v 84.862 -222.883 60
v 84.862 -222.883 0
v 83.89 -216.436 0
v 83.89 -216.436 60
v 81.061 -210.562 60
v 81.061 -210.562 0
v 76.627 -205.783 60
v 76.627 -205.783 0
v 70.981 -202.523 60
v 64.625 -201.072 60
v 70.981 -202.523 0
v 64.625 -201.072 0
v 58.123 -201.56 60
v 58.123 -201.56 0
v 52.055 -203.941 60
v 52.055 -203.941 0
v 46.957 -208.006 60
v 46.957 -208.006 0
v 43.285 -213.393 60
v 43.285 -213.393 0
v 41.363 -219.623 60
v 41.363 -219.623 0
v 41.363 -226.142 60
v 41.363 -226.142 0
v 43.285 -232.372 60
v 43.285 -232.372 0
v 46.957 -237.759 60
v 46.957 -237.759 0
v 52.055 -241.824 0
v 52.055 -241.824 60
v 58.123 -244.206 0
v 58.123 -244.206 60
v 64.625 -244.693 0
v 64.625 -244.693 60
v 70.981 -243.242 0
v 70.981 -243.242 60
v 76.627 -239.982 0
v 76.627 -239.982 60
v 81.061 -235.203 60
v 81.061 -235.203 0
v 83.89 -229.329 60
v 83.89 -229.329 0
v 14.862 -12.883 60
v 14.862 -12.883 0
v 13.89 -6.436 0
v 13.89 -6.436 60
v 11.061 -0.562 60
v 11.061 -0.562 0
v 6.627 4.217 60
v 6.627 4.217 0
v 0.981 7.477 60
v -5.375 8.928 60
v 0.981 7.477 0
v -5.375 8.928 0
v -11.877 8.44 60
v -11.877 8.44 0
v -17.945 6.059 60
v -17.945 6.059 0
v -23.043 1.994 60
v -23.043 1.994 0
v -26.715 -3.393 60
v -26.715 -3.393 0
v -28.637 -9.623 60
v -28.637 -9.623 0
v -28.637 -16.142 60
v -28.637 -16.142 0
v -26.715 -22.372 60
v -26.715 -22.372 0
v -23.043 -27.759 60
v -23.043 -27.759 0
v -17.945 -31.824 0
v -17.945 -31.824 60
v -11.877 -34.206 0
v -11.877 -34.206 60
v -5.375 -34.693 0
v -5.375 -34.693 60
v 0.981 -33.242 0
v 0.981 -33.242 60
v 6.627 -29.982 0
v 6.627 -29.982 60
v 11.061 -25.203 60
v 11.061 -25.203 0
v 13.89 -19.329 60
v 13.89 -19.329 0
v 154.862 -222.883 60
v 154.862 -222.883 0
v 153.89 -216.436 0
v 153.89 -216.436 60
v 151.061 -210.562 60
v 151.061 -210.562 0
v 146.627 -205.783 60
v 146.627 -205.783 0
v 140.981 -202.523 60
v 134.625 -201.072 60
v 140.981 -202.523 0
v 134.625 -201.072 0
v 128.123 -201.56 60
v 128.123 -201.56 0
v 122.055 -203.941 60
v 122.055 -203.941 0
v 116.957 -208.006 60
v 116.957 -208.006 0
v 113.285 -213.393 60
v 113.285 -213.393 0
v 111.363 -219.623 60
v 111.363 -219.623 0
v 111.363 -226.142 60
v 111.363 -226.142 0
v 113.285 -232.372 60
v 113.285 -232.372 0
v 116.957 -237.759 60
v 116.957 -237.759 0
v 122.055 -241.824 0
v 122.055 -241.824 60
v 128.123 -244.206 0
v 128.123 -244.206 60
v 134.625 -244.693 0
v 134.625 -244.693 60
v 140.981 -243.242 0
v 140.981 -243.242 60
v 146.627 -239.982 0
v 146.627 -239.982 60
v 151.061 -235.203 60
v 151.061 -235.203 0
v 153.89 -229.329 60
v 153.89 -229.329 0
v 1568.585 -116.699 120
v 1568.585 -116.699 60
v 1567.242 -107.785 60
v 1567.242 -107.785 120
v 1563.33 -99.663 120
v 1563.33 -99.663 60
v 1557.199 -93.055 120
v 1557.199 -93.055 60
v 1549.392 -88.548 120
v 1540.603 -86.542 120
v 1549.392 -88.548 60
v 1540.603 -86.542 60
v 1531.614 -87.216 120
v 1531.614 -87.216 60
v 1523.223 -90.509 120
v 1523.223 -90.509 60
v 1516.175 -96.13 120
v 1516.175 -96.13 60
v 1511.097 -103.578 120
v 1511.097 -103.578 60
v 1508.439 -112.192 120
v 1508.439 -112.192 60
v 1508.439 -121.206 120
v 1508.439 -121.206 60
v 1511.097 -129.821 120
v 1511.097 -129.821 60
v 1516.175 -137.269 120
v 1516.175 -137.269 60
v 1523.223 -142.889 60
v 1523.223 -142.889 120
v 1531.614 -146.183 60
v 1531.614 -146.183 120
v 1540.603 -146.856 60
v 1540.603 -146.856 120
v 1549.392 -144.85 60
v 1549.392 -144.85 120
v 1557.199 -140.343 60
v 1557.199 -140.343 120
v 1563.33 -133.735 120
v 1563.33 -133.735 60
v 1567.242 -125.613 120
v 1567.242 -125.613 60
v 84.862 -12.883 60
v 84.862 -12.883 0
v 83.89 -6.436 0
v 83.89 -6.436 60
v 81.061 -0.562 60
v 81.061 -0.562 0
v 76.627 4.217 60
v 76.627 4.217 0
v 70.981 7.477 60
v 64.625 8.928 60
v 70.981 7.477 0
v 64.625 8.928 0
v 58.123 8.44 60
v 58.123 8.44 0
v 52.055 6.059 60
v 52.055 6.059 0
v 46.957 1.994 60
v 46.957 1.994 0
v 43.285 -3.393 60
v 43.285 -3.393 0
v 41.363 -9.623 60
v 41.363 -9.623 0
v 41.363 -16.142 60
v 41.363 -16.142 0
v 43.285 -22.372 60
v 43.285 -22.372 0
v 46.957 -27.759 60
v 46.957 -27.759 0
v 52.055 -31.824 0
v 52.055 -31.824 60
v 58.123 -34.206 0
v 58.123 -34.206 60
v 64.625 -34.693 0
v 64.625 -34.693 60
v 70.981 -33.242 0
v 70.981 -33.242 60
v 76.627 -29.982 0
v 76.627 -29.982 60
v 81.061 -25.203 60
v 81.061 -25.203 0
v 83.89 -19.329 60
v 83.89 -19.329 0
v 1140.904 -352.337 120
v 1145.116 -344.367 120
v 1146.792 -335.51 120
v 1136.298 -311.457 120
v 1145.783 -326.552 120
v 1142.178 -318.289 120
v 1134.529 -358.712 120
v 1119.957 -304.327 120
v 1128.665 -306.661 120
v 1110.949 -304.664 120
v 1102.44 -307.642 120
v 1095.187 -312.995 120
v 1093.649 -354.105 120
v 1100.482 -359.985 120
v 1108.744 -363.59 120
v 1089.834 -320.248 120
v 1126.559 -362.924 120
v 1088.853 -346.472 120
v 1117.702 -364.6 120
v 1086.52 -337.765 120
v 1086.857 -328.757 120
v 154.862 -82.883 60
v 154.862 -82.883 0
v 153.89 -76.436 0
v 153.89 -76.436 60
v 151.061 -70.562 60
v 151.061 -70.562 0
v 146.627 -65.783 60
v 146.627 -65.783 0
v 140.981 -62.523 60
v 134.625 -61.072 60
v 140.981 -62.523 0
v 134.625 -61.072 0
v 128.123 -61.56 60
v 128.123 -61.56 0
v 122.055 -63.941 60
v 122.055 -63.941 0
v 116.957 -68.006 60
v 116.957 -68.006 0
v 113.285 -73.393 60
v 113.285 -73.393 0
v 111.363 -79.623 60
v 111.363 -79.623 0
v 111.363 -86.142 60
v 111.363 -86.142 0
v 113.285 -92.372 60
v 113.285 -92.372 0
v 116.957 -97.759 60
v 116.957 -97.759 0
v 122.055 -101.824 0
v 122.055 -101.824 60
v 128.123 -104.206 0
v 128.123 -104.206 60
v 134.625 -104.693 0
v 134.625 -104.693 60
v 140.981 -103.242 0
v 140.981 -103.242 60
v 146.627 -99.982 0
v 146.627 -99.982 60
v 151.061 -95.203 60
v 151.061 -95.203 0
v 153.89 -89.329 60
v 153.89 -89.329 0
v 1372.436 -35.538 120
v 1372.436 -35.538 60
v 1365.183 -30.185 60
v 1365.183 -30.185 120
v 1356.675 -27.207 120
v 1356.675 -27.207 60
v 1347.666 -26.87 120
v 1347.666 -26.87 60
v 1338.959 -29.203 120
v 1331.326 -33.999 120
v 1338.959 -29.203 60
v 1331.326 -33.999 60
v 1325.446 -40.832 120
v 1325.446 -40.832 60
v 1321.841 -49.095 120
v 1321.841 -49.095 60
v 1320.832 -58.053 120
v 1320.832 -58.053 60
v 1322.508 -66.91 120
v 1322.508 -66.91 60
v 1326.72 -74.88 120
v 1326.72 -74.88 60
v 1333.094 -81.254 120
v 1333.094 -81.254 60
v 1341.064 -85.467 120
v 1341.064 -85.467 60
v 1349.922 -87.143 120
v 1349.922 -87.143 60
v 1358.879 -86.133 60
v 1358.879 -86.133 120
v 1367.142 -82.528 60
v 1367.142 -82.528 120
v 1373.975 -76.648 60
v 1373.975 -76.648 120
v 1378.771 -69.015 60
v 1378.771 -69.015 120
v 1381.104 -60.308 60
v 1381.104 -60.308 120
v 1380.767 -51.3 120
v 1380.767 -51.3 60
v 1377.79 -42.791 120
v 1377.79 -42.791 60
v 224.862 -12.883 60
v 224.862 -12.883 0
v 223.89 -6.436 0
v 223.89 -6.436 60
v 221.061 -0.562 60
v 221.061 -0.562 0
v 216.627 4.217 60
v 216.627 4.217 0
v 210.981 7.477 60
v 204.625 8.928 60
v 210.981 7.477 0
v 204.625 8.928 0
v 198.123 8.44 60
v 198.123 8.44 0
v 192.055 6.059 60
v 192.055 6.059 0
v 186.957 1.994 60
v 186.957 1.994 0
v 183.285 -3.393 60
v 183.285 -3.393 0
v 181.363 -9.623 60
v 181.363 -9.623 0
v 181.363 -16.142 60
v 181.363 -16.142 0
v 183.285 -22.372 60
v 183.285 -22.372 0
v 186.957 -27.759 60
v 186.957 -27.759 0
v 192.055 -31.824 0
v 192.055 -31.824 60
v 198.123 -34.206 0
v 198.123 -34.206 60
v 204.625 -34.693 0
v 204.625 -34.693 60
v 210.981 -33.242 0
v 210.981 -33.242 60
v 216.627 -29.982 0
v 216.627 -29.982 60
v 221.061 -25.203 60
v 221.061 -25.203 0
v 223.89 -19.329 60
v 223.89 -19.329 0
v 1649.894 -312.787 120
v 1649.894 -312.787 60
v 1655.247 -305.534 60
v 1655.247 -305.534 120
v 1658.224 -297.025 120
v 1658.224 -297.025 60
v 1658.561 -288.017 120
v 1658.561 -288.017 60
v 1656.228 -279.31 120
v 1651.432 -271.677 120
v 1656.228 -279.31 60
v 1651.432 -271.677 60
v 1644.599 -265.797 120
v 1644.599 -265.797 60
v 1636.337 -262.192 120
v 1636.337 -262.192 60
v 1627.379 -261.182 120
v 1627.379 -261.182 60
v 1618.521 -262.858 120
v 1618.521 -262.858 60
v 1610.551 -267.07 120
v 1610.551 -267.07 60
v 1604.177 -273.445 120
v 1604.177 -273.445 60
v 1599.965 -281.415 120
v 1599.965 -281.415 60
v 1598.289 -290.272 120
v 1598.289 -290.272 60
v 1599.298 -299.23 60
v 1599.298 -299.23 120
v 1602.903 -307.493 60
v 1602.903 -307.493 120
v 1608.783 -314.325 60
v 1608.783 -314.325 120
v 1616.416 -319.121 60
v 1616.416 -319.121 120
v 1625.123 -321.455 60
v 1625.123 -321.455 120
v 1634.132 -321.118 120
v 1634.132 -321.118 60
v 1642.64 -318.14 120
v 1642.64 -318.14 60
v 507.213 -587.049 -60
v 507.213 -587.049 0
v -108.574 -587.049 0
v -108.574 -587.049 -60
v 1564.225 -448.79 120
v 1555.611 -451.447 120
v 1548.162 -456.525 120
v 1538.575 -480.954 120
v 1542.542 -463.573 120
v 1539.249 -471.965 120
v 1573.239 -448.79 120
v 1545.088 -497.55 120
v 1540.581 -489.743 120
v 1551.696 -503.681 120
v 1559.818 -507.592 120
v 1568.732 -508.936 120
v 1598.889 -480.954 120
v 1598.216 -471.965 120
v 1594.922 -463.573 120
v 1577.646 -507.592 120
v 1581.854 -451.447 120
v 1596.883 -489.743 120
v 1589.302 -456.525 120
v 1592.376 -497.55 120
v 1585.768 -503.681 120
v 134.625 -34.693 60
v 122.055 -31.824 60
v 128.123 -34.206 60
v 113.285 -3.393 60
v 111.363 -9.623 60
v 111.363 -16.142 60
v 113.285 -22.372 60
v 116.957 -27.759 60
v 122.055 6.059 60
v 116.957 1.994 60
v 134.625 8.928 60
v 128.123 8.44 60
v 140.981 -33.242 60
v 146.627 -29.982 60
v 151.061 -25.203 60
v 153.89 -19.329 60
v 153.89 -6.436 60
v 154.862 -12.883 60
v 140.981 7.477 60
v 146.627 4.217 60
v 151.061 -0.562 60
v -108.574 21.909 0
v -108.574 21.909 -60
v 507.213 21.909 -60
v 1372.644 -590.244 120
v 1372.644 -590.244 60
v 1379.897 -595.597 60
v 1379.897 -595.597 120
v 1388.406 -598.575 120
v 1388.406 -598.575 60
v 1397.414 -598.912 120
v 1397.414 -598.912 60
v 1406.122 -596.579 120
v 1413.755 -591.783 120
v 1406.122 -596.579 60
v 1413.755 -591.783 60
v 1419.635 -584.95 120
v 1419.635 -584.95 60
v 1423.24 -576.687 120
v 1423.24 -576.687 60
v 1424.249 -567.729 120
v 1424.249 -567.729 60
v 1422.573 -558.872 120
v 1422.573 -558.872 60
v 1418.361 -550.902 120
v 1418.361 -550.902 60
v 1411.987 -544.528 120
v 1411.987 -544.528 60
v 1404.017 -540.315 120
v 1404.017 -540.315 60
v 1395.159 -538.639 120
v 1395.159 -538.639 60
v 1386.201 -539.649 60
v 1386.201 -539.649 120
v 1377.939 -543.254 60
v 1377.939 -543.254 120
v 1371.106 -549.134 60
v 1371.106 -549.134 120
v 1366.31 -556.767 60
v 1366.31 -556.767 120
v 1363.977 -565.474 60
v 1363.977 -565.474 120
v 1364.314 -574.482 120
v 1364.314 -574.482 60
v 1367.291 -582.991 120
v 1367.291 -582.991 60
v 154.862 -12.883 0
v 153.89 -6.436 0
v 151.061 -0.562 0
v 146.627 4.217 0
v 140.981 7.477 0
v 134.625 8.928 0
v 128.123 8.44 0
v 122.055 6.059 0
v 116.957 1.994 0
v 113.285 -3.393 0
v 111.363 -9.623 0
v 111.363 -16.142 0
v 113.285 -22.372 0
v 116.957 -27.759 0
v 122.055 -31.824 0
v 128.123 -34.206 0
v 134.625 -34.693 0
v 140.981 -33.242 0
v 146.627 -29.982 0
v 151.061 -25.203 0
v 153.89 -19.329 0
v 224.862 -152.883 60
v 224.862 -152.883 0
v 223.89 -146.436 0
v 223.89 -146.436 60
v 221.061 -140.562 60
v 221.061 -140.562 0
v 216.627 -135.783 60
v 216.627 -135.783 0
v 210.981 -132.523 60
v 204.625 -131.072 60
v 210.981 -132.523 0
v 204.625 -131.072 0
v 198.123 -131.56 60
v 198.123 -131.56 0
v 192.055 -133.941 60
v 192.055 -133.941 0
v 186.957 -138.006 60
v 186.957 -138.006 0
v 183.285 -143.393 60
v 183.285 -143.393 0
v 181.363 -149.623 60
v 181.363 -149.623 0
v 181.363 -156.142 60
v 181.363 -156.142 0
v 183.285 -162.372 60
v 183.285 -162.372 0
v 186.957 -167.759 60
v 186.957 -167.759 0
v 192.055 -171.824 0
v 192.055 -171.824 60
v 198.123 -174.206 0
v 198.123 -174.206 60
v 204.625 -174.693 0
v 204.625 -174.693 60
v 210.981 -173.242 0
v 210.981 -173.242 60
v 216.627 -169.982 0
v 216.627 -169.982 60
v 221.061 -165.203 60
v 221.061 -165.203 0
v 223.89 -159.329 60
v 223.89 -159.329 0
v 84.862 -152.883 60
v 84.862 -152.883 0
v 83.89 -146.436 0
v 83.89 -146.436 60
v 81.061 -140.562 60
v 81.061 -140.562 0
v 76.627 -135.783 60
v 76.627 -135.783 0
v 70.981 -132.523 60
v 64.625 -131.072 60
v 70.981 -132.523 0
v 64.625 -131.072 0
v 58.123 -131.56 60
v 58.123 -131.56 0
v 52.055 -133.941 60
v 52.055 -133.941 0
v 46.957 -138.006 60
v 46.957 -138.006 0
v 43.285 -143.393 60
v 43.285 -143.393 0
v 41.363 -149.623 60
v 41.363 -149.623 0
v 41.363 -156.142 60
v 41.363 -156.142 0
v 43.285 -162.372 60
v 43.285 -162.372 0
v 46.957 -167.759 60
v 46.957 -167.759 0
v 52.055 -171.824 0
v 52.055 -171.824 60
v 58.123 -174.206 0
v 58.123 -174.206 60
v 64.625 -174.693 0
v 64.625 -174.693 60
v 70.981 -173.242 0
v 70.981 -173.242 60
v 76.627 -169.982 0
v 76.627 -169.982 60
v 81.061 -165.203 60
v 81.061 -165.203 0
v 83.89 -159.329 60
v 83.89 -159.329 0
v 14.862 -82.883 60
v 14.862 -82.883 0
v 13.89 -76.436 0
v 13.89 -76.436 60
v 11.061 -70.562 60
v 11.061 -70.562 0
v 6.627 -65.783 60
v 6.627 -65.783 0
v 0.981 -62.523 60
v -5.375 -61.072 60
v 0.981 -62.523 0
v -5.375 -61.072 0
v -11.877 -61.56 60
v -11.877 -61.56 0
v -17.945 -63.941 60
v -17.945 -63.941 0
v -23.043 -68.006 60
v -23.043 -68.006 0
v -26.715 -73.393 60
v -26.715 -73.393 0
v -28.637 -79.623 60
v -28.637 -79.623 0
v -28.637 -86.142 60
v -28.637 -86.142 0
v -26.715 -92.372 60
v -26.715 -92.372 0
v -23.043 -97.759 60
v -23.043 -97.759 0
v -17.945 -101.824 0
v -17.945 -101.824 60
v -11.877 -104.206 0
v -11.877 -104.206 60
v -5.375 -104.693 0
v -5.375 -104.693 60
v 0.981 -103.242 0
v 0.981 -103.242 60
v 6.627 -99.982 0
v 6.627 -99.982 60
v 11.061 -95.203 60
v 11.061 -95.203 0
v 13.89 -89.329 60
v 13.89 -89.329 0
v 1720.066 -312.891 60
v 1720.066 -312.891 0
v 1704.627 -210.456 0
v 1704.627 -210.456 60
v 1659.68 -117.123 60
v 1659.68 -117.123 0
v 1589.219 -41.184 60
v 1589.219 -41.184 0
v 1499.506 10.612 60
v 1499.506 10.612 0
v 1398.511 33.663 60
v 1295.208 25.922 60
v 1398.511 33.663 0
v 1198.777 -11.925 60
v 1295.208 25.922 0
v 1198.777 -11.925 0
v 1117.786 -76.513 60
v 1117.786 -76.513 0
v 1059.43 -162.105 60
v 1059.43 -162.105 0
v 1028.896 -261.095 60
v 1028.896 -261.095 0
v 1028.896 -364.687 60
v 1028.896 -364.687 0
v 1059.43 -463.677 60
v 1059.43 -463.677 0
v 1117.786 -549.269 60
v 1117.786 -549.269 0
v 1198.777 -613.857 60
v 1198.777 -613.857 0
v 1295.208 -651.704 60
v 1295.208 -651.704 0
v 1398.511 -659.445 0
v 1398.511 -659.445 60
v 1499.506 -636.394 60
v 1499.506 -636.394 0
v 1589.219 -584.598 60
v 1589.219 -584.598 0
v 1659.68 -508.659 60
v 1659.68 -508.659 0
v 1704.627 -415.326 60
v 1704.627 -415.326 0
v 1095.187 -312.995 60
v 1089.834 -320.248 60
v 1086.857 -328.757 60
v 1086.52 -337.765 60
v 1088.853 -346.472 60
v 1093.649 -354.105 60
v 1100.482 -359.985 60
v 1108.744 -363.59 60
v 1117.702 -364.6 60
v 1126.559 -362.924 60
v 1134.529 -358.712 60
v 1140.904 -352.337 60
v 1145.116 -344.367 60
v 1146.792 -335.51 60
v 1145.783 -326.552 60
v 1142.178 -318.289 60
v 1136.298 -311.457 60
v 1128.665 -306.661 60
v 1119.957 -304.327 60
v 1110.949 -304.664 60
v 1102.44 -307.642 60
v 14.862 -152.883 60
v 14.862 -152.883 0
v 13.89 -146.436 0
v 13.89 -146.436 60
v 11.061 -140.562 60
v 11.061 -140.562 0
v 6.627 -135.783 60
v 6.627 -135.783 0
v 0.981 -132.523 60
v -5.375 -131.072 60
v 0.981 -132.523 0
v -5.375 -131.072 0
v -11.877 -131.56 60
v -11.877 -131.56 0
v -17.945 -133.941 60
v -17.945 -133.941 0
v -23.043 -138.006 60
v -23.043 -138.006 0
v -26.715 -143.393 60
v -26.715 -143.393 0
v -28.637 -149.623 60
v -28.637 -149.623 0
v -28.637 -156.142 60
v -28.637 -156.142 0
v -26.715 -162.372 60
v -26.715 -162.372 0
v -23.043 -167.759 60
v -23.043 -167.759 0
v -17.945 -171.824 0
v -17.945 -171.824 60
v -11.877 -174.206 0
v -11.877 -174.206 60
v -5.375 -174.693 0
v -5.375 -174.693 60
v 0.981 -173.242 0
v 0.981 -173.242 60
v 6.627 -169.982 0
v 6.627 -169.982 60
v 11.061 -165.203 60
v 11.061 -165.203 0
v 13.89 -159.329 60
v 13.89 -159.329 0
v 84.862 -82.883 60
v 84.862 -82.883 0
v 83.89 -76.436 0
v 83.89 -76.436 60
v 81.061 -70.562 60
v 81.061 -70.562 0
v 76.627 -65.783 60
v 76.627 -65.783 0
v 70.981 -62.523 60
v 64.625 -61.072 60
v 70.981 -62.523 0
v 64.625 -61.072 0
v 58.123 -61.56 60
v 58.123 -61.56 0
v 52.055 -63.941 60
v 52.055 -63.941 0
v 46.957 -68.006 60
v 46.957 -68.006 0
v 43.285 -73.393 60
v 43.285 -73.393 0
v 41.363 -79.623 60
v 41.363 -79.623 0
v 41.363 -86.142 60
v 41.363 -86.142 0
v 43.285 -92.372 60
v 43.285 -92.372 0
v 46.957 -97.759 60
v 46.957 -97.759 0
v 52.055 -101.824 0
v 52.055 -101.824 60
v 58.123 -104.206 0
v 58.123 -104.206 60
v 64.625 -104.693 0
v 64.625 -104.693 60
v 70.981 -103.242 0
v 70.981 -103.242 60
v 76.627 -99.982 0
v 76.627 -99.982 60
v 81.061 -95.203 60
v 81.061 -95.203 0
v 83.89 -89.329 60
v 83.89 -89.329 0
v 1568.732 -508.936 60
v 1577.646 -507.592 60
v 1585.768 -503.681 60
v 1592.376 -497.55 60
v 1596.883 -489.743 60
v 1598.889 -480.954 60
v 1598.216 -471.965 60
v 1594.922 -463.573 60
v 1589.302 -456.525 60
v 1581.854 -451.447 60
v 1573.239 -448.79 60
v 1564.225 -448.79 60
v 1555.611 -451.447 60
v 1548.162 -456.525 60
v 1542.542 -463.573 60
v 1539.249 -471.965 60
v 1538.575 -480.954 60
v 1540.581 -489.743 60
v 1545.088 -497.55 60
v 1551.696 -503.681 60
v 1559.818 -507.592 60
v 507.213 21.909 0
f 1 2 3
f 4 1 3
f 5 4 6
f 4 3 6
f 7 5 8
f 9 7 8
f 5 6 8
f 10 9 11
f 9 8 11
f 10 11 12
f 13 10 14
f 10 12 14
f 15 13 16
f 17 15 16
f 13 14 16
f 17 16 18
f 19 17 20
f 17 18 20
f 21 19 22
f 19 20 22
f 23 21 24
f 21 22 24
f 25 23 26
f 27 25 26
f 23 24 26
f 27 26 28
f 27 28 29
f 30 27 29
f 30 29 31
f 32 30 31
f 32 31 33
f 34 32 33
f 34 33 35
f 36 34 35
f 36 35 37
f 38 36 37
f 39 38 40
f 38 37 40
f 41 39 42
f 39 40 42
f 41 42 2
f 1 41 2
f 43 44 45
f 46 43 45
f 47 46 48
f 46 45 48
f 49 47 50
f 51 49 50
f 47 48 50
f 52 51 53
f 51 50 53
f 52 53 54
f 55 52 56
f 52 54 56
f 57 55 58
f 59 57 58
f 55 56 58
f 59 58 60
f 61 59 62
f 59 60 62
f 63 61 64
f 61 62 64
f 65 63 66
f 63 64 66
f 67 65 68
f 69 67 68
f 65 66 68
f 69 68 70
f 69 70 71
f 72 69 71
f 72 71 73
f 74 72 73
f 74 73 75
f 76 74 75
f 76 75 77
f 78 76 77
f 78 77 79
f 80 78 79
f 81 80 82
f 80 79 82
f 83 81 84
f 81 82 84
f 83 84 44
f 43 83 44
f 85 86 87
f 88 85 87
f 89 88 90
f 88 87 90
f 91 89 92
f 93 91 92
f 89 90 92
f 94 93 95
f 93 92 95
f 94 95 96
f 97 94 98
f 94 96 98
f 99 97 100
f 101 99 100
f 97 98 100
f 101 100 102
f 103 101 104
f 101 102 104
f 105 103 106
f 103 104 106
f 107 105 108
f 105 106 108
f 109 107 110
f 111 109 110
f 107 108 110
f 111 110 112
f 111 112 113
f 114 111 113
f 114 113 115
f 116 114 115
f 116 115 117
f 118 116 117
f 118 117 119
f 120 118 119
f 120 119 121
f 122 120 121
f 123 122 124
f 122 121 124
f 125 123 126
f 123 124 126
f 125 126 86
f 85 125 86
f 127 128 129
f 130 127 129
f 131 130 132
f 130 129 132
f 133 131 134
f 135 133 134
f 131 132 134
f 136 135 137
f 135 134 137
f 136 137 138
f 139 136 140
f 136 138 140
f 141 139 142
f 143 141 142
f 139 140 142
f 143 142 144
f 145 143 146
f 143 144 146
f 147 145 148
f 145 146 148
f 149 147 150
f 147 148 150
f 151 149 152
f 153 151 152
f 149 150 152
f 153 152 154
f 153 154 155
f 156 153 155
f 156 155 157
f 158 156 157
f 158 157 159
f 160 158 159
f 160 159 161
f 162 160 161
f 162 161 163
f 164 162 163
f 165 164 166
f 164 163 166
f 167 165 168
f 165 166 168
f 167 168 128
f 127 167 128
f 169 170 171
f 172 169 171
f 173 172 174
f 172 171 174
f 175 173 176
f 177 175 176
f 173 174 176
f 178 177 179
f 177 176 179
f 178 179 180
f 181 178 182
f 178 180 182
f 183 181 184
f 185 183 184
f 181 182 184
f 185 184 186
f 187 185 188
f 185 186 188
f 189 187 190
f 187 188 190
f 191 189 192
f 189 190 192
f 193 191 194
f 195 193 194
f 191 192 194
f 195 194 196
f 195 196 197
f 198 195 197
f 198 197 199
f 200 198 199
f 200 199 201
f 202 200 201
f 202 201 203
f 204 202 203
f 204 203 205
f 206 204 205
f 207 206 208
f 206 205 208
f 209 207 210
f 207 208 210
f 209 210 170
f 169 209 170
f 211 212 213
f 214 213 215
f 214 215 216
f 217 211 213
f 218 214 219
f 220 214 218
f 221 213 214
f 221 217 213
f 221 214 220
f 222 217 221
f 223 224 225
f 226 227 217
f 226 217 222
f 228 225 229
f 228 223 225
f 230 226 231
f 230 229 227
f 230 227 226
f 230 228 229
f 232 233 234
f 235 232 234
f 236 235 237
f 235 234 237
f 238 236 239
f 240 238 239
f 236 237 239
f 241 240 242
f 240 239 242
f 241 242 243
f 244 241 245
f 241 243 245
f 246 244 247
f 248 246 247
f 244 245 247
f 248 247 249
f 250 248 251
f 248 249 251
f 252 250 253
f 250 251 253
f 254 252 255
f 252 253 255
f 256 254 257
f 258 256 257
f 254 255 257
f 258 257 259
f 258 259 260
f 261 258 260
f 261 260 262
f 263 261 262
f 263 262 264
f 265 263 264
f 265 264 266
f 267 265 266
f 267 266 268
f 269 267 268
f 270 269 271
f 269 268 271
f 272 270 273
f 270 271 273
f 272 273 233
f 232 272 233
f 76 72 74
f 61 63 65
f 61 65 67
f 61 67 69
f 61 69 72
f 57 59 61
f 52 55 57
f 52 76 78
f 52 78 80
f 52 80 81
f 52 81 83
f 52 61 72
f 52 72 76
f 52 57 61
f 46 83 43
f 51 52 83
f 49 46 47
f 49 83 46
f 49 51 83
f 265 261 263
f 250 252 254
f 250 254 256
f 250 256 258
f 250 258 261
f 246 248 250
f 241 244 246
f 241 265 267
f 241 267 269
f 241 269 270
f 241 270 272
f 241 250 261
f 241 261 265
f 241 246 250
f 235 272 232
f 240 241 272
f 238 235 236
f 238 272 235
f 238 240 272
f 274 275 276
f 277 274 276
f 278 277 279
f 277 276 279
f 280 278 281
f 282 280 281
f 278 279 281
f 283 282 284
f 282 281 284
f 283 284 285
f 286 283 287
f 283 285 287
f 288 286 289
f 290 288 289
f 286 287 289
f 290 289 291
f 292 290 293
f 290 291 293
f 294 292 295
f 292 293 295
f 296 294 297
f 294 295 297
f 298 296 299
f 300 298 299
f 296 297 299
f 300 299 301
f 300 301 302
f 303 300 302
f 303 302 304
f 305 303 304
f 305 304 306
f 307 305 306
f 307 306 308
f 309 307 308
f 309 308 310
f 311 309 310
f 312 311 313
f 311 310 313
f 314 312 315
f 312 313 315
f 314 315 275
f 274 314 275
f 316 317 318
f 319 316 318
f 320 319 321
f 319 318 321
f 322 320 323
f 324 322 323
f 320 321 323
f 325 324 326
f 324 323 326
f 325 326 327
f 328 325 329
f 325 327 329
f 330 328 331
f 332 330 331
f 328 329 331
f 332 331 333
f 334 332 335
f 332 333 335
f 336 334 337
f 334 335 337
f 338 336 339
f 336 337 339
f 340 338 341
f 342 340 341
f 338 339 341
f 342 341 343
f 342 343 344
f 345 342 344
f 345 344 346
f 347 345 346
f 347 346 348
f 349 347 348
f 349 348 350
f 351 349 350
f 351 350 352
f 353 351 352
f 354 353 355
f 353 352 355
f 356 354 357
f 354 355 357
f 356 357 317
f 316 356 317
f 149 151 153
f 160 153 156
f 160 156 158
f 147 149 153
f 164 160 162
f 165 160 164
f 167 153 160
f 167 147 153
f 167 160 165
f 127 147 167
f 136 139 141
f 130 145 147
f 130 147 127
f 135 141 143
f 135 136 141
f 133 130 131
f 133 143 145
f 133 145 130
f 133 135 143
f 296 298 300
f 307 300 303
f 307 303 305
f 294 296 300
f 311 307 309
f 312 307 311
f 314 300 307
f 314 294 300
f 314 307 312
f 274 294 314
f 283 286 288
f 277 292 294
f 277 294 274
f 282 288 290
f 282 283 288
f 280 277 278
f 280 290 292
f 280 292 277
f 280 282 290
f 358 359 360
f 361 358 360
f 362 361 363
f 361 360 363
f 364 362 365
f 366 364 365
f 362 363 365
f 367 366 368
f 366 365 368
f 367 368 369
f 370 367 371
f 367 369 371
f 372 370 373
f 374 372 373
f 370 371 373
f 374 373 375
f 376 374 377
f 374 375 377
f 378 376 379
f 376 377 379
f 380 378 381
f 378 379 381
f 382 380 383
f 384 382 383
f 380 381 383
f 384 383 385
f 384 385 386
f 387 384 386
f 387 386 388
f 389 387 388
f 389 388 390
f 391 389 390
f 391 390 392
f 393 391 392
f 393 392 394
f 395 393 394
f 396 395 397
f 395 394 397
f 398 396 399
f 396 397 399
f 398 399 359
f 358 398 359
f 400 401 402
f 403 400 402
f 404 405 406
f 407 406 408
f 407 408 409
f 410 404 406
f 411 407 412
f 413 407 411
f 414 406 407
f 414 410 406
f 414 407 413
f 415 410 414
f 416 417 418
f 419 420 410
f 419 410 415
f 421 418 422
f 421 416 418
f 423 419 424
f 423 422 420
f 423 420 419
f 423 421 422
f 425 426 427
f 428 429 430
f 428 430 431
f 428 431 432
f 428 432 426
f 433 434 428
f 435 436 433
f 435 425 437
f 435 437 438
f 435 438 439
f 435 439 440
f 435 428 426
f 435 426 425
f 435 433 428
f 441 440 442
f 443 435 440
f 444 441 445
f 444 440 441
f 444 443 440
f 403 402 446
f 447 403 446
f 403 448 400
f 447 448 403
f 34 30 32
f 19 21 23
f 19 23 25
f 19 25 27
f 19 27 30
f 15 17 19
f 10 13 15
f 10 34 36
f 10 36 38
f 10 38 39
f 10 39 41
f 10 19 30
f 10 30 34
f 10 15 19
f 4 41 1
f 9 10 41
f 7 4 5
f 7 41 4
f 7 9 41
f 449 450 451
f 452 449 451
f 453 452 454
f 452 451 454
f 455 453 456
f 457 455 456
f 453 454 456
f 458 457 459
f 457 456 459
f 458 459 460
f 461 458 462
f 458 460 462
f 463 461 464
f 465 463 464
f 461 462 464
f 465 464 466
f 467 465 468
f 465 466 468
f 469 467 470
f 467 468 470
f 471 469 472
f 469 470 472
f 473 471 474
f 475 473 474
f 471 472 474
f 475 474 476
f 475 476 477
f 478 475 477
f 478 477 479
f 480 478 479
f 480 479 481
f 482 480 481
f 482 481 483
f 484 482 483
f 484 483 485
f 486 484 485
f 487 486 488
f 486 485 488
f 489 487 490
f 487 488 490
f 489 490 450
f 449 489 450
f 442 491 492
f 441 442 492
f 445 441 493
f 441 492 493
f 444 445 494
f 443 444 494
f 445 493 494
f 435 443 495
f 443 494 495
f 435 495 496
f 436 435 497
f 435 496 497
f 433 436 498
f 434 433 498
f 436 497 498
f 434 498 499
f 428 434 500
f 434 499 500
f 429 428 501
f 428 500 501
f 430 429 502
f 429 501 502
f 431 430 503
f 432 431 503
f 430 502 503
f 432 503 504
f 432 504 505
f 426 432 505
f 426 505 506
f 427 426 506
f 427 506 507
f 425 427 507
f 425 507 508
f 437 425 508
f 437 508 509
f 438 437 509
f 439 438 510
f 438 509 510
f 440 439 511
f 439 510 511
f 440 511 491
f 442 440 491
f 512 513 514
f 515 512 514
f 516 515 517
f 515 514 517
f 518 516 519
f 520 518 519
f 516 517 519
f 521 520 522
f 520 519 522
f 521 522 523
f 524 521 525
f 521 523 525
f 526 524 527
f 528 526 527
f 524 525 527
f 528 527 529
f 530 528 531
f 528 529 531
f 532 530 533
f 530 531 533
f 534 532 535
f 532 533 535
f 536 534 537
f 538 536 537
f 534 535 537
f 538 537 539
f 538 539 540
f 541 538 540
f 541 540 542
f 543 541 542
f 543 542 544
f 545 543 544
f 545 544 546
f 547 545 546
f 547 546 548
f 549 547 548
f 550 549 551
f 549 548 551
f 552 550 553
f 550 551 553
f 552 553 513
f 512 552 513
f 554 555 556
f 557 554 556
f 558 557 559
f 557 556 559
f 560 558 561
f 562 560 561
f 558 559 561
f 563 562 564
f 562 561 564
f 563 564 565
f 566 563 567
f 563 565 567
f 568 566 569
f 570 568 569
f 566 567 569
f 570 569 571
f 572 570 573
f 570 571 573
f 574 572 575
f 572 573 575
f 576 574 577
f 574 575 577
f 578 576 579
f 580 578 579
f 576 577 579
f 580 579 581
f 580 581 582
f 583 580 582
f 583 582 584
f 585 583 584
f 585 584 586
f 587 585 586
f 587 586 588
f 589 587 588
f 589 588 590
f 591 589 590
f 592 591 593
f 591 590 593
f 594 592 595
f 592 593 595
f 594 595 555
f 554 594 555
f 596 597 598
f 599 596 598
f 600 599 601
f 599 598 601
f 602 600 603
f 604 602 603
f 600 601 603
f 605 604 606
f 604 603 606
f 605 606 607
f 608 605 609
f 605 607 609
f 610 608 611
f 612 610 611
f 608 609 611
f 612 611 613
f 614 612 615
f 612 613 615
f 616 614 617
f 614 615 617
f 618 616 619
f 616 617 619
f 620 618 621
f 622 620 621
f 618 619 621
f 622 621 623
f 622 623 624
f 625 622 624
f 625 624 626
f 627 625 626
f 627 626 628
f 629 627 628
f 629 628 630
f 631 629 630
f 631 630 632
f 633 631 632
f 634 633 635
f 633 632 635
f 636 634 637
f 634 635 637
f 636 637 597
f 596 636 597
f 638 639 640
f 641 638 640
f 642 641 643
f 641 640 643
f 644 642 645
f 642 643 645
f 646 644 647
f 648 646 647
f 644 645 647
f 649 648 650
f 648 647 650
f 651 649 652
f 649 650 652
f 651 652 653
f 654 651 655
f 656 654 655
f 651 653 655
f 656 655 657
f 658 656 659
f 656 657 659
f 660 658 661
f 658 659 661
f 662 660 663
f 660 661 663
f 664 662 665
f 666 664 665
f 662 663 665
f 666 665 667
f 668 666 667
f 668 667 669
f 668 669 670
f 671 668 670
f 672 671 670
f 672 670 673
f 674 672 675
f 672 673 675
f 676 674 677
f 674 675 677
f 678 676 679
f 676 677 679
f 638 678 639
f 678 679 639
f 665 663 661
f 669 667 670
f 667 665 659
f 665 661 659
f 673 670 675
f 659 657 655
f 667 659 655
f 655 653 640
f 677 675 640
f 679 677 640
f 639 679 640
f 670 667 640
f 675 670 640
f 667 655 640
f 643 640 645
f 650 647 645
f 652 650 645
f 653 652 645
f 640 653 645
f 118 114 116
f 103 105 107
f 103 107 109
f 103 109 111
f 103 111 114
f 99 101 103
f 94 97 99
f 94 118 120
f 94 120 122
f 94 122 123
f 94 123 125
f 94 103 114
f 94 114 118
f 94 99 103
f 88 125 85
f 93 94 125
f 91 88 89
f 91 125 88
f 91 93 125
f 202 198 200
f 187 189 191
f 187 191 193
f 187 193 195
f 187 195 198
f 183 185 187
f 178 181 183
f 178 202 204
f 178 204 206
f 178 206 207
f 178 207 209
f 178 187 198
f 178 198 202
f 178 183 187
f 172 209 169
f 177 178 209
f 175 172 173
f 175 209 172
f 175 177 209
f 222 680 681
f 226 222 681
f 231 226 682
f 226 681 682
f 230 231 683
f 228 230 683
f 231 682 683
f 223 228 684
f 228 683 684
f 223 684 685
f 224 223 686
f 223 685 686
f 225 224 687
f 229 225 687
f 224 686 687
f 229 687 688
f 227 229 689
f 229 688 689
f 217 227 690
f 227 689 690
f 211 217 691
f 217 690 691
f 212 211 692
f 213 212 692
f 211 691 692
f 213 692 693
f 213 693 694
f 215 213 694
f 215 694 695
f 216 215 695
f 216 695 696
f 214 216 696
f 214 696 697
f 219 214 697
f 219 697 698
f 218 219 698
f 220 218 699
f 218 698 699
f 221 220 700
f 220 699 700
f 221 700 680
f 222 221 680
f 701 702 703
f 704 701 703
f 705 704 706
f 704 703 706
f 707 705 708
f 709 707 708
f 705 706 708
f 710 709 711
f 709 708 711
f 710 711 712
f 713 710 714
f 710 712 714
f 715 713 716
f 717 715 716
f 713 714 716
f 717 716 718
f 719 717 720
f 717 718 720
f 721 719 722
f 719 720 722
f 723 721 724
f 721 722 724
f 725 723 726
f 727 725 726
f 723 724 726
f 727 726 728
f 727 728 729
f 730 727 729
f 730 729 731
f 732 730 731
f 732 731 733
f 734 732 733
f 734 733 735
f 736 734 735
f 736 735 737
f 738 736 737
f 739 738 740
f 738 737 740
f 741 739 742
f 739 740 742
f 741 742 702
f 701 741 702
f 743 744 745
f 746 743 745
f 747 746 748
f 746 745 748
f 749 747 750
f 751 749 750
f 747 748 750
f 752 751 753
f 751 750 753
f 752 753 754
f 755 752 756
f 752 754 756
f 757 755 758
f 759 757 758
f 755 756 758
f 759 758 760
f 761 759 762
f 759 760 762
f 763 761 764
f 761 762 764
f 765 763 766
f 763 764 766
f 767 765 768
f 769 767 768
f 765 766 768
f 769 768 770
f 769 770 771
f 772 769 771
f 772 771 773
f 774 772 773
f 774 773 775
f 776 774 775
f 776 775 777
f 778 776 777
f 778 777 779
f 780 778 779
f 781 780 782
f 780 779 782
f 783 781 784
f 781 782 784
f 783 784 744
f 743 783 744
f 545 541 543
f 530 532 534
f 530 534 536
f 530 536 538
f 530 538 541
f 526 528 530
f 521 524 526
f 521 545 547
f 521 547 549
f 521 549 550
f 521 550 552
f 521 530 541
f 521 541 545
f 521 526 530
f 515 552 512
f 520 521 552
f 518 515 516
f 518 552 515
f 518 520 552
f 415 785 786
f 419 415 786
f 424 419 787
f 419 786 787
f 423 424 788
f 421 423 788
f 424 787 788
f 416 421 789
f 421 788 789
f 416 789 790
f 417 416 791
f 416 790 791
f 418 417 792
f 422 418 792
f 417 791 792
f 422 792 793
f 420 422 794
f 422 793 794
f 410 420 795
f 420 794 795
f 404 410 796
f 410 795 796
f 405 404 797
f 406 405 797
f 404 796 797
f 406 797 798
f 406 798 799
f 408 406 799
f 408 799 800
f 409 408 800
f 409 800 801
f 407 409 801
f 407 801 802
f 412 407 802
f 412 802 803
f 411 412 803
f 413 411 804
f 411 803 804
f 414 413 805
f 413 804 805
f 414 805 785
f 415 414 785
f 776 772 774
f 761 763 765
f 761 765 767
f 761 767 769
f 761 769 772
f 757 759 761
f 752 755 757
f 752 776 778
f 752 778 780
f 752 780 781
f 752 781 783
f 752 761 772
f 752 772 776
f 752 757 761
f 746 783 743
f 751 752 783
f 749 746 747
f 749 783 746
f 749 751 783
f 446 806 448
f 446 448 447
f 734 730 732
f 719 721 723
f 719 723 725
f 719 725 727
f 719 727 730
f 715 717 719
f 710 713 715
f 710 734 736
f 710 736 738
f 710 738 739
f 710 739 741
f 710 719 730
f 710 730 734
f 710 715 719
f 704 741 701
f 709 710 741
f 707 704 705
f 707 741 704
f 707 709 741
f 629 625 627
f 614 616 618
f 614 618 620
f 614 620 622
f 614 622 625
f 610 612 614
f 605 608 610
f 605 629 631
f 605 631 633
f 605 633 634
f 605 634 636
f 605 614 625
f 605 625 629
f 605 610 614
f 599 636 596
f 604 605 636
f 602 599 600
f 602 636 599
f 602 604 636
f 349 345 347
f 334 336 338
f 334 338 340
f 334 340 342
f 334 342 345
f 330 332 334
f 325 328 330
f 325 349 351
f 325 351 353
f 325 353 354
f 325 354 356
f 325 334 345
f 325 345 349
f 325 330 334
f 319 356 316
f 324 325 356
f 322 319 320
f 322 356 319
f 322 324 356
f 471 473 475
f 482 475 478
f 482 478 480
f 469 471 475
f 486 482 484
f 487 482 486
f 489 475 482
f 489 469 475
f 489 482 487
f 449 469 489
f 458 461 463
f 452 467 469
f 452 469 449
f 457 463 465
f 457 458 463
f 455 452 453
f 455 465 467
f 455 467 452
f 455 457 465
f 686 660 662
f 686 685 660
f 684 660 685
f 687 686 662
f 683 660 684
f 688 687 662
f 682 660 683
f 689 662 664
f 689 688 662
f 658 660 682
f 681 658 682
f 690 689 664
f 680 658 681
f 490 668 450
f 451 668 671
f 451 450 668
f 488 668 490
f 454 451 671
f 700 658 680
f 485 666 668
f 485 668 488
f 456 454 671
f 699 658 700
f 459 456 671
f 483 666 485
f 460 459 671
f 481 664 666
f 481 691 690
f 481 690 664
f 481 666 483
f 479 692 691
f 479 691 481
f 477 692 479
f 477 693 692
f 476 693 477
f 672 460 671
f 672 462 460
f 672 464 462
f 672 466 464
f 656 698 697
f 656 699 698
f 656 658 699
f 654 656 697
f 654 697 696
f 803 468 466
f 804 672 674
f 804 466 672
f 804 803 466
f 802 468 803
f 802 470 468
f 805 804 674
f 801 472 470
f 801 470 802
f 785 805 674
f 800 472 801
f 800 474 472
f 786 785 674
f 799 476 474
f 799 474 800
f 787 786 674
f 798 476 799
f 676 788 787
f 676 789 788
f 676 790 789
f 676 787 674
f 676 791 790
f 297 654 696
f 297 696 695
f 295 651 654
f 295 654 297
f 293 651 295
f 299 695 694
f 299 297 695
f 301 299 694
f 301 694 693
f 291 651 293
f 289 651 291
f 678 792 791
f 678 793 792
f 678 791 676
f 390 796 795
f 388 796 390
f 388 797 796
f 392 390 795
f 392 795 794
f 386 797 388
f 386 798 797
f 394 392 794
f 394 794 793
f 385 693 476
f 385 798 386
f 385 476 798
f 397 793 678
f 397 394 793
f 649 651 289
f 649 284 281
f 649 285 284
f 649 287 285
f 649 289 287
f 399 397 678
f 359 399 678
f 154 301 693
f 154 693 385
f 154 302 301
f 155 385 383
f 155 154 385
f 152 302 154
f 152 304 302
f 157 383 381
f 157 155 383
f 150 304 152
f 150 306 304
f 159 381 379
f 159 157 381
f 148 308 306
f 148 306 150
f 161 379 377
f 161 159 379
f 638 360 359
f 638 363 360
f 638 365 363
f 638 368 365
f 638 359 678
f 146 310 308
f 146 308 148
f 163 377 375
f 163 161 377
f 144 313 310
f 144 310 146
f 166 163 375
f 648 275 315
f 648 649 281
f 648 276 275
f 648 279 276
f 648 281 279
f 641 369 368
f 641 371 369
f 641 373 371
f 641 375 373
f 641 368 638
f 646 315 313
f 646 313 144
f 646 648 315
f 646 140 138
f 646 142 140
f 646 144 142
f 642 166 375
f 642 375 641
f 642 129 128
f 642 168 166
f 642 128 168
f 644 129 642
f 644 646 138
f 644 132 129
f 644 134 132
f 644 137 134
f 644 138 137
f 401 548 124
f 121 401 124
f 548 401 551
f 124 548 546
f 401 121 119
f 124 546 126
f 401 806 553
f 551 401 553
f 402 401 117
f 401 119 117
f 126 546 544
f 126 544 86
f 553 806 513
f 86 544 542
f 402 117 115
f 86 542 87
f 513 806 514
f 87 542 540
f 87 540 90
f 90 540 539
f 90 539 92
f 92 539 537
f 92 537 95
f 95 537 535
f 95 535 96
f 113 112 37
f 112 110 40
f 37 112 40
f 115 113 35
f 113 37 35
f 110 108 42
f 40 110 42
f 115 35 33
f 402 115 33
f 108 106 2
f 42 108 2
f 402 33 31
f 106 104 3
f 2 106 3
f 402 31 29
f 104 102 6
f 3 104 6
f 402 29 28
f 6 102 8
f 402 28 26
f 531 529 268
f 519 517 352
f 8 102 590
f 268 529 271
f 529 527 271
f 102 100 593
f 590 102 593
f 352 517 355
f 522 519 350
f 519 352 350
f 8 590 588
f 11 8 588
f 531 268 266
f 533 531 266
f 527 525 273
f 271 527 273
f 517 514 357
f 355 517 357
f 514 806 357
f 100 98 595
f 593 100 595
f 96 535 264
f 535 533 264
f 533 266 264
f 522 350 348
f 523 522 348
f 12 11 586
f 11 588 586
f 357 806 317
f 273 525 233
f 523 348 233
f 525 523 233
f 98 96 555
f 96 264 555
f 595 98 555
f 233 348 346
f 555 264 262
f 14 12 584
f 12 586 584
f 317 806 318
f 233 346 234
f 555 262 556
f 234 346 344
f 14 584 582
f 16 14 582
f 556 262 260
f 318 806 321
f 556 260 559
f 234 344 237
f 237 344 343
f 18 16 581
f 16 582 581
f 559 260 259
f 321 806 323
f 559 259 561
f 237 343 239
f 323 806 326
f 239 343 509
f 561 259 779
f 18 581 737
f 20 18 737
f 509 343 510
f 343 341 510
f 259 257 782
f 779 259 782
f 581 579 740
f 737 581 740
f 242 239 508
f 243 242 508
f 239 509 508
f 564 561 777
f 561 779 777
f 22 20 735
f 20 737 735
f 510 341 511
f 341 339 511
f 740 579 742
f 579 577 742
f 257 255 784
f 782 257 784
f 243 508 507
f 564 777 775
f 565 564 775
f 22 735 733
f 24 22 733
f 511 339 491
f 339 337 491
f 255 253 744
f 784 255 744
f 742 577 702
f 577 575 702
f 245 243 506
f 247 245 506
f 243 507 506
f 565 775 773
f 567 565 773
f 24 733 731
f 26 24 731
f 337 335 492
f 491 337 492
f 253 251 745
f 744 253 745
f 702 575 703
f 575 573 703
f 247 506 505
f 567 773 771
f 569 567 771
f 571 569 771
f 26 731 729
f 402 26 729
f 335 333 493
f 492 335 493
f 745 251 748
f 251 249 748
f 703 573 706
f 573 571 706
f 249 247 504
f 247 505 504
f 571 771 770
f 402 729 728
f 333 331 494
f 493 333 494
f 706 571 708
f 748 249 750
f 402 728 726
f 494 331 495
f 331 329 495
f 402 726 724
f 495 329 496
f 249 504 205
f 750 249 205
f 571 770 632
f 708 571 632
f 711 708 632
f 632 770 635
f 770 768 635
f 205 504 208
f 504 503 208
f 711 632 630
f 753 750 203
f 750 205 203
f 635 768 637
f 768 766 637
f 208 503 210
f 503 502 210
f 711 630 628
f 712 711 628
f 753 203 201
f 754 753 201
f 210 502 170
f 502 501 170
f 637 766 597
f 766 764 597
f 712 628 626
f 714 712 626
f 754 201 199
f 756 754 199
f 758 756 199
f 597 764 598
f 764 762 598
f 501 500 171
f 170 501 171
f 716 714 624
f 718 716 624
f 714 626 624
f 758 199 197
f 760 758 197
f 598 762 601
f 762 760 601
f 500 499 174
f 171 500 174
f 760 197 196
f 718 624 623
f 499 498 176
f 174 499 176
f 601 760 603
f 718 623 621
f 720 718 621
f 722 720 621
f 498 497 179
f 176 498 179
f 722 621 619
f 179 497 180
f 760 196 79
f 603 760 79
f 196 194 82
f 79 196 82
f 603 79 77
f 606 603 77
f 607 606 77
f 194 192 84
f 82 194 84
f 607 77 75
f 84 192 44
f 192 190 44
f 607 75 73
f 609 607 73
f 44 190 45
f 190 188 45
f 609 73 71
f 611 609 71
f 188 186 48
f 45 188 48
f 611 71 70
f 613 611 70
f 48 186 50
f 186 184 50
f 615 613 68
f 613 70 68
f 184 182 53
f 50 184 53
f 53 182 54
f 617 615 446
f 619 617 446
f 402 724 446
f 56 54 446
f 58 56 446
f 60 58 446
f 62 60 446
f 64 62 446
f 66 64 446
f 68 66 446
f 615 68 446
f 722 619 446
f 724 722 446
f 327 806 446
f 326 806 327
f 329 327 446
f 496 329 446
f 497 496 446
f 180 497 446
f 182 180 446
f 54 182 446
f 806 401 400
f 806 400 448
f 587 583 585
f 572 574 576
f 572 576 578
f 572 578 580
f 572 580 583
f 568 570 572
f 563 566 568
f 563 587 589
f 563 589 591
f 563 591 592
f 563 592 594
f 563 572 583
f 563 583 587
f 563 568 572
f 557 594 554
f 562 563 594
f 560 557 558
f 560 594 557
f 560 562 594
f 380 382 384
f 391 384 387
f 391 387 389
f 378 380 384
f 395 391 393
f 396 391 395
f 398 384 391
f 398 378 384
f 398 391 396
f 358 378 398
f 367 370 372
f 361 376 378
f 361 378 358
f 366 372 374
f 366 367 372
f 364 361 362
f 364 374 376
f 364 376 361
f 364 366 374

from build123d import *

# Parameters (mm, degrees)
SKETCH_1_R                  = 21.871507145
EXTRUDE_1_DEPTH             = 60
SKETCH_2_W                  = 615.786145386
SKETCH_2_H                  = 608.957645948
EXTRUDE_2_DEPTH             = 60
PATTERN_LINEAR_1_COUNT      = 4
PATTERN_LINEAR_1_PITCH      = 70
PATTERN_LINEAR_1_COUNT_DIR2 = 4
PATTERN_LINEAR_1_PITCH_DIR2 = 70
SKETCH_3_R                  = 347.526096985
EXTRUDE_3_DEPTH             = 60
SKETCH_4_R                  = 30.241800189
EXTRUDE_4_DEPTH             = 60
PATTERN_CIRCULAR_1_COUNT    = 8


with BuildPart() as part:
    # 스케치1 → 보스-돌출1 (new body)
    with BuildSketch(Plane.XY):
        with Locations((-7.009675974, -12.882647736)):
            Circle(SKETCH_1_R)
    extrude_1 = extrude(amount=EXTRUDE_1_DEPTH)

    # 스케치2 → 보스-돌출2 (add)
    with BuildSketch(Plane(origin=(0, 0, 0), x_dir=(-1, 0, 0), z_dir=(0, 0, -1))):
        with Locations((-199.319491443, -282.570126777)):
            Rectangle(SKETCH_2_W, SKETCH_2_H)
    extrude(amount=EXTRUDE_2_DEPTH)

    # 선형 패턴1: Extrude 1 4 × 4, 4 skipped
    with Locations(*[(i * PATTERN_LINEAR_1_PITCH, -j * PATTERN_LINEAR_1_PITCH_DIR2, 0) for i in range(PATTERN_LINEAR_1_COUNT) for j in range(PATTERN_LINEAR_1_COUNT_DIR2) if (i, j) not in ((0, 0), (0, 3), (2, 2), (3, 1), (3, 3))]):
        add(extrude_1)


with BuildPart() as body_2:
    # 스케치3 → 보스-돌출3 (new body)
    with BuildSketch(Plane.XY):
        with Locations((1372.540328565, -312.890998646)):
            Circle(SKETCH_3_R)
    extrude(amount=EXTRUDE_3_DEPTH)

    # 스케치4 → 보스-돌출4 (add)
    with BuildSketch(Plane.XY.offset(60)):
        with Locations((1538.343488855, -116.699191153)):
            Circle(SKETCH_4_R)
    extrude_4 = extrude(amount=EXTRUDE_4_DEPTH)

    # 원형 패턴1: 보스-돌출4 ×8 about axis, 2 skipped
    pattern_circular_1_axis = Axis((1372.540328565, -312.890998646, 0), (0, 0, 1))
    add([extrude_4.rotate(pattern_circular_1_axis, i * 360 / PATTERN_CIRCULAR_1_COUNT) for i in range(1, PATTERN_CIRCULAR_1_COUNT) if i not in (2, 4)])


solid = Compound([part.part, body_2.part])
